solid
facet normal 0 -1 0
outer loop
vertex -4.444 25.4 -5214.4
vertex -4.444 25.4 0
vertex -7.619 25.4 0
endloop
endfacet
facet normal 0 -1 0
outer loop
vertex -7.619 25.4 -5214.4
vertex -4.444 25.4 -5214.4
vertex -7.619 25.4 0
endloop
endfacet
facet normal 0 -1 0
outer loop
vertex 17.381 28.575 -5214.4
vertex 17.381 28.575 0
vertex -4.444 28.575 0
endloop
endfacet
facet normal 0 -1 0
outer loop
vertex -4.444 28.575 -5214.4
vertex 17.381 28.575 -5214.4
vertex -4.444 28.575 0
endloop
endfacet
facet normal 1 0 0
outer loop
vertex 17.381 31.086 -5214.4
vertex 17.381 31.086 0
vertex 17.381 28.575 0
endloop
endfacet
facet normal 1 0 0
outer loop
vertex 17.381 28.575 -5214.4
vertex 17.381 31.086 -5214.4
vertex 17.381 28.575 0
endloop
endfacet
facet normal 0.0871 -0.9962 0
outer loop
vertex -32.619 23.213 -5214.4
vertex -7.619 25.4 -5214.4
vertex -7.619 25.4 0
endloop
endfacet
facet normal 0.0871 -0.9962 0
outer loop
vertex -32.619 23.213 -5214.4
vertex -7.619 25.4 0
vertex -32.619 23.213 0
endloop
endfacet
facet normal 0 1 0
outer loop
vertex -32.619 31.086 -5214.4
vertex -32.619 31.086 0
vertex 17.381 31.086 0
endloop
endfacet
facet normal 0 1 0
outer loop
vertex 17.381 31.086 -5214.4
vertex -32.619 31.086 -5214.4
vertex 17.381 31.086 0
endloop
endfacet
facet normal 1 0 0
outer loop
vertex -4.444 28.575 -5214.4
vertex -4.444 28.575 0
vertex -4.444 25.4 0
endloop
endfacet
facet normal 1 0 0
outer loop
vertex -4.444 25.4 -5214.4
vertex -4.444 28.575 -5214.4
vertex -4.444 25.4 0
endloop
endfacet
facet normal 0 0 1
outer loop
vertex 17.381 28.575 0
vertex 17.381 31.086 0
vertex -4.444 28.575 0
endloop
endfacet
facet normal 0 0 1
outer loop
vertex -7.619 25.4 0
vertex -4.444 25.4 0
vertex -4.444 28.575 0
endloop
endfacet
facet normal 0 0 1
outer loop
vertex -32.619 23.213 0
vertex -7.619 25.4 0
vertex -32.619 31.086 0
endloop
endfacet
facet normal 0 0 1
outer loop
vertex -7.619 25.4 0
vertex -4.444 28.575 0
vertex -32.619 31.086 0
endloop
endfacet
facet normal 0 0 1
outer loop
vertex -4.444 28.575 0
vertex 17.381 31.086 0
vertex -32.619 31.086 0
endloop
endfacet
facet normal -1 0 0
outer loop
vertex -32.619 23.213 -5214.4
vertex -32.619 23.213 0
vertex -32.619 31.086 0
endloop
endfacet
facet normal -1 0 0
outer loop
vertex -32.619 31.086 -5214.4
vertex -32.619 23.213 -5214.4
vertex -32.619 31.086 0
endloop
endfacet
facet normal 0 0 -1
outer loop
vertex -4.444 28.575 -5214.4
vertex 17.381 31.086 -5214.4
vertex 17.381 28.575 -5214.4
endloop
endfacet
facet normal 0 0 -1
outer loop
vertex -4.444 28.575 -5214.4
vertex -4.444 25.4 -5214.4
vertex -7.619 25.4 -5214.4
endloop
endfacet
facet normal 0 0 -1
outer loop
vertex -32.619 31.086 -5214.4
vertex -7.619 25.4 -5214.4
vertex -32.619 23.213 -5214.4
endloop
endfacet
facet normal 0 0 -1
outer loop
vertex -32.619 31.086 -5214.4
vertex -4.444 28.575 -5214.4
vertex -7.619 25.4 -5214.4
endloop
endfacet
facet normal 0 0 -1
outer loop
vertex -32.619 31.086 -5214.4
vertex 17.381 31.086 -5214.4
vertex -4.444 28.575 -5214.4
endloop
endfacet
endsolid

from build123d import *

# Parameters (mm, degrees)
BOSS_EXTRUDE1_DEPTH = 5214.4


with BuildPart() as part:
    # Sketch2 → Boss-Extrude1 (new body)
    with BuildSketch(Plane.XY):
        Polygon((-7.619424107, 25.4), (-32.619424107, 23.212783412), (-32.619424107, 31.086256538), (17.380575893, 31.086256538), (17.380575893, 28.575), (-4.444424107, 28.575), (-4.444424107, 25.4), align=None)
    extrude(amount=-BOSS_EXTRUDE1_DEPTH)


solid = part.part
